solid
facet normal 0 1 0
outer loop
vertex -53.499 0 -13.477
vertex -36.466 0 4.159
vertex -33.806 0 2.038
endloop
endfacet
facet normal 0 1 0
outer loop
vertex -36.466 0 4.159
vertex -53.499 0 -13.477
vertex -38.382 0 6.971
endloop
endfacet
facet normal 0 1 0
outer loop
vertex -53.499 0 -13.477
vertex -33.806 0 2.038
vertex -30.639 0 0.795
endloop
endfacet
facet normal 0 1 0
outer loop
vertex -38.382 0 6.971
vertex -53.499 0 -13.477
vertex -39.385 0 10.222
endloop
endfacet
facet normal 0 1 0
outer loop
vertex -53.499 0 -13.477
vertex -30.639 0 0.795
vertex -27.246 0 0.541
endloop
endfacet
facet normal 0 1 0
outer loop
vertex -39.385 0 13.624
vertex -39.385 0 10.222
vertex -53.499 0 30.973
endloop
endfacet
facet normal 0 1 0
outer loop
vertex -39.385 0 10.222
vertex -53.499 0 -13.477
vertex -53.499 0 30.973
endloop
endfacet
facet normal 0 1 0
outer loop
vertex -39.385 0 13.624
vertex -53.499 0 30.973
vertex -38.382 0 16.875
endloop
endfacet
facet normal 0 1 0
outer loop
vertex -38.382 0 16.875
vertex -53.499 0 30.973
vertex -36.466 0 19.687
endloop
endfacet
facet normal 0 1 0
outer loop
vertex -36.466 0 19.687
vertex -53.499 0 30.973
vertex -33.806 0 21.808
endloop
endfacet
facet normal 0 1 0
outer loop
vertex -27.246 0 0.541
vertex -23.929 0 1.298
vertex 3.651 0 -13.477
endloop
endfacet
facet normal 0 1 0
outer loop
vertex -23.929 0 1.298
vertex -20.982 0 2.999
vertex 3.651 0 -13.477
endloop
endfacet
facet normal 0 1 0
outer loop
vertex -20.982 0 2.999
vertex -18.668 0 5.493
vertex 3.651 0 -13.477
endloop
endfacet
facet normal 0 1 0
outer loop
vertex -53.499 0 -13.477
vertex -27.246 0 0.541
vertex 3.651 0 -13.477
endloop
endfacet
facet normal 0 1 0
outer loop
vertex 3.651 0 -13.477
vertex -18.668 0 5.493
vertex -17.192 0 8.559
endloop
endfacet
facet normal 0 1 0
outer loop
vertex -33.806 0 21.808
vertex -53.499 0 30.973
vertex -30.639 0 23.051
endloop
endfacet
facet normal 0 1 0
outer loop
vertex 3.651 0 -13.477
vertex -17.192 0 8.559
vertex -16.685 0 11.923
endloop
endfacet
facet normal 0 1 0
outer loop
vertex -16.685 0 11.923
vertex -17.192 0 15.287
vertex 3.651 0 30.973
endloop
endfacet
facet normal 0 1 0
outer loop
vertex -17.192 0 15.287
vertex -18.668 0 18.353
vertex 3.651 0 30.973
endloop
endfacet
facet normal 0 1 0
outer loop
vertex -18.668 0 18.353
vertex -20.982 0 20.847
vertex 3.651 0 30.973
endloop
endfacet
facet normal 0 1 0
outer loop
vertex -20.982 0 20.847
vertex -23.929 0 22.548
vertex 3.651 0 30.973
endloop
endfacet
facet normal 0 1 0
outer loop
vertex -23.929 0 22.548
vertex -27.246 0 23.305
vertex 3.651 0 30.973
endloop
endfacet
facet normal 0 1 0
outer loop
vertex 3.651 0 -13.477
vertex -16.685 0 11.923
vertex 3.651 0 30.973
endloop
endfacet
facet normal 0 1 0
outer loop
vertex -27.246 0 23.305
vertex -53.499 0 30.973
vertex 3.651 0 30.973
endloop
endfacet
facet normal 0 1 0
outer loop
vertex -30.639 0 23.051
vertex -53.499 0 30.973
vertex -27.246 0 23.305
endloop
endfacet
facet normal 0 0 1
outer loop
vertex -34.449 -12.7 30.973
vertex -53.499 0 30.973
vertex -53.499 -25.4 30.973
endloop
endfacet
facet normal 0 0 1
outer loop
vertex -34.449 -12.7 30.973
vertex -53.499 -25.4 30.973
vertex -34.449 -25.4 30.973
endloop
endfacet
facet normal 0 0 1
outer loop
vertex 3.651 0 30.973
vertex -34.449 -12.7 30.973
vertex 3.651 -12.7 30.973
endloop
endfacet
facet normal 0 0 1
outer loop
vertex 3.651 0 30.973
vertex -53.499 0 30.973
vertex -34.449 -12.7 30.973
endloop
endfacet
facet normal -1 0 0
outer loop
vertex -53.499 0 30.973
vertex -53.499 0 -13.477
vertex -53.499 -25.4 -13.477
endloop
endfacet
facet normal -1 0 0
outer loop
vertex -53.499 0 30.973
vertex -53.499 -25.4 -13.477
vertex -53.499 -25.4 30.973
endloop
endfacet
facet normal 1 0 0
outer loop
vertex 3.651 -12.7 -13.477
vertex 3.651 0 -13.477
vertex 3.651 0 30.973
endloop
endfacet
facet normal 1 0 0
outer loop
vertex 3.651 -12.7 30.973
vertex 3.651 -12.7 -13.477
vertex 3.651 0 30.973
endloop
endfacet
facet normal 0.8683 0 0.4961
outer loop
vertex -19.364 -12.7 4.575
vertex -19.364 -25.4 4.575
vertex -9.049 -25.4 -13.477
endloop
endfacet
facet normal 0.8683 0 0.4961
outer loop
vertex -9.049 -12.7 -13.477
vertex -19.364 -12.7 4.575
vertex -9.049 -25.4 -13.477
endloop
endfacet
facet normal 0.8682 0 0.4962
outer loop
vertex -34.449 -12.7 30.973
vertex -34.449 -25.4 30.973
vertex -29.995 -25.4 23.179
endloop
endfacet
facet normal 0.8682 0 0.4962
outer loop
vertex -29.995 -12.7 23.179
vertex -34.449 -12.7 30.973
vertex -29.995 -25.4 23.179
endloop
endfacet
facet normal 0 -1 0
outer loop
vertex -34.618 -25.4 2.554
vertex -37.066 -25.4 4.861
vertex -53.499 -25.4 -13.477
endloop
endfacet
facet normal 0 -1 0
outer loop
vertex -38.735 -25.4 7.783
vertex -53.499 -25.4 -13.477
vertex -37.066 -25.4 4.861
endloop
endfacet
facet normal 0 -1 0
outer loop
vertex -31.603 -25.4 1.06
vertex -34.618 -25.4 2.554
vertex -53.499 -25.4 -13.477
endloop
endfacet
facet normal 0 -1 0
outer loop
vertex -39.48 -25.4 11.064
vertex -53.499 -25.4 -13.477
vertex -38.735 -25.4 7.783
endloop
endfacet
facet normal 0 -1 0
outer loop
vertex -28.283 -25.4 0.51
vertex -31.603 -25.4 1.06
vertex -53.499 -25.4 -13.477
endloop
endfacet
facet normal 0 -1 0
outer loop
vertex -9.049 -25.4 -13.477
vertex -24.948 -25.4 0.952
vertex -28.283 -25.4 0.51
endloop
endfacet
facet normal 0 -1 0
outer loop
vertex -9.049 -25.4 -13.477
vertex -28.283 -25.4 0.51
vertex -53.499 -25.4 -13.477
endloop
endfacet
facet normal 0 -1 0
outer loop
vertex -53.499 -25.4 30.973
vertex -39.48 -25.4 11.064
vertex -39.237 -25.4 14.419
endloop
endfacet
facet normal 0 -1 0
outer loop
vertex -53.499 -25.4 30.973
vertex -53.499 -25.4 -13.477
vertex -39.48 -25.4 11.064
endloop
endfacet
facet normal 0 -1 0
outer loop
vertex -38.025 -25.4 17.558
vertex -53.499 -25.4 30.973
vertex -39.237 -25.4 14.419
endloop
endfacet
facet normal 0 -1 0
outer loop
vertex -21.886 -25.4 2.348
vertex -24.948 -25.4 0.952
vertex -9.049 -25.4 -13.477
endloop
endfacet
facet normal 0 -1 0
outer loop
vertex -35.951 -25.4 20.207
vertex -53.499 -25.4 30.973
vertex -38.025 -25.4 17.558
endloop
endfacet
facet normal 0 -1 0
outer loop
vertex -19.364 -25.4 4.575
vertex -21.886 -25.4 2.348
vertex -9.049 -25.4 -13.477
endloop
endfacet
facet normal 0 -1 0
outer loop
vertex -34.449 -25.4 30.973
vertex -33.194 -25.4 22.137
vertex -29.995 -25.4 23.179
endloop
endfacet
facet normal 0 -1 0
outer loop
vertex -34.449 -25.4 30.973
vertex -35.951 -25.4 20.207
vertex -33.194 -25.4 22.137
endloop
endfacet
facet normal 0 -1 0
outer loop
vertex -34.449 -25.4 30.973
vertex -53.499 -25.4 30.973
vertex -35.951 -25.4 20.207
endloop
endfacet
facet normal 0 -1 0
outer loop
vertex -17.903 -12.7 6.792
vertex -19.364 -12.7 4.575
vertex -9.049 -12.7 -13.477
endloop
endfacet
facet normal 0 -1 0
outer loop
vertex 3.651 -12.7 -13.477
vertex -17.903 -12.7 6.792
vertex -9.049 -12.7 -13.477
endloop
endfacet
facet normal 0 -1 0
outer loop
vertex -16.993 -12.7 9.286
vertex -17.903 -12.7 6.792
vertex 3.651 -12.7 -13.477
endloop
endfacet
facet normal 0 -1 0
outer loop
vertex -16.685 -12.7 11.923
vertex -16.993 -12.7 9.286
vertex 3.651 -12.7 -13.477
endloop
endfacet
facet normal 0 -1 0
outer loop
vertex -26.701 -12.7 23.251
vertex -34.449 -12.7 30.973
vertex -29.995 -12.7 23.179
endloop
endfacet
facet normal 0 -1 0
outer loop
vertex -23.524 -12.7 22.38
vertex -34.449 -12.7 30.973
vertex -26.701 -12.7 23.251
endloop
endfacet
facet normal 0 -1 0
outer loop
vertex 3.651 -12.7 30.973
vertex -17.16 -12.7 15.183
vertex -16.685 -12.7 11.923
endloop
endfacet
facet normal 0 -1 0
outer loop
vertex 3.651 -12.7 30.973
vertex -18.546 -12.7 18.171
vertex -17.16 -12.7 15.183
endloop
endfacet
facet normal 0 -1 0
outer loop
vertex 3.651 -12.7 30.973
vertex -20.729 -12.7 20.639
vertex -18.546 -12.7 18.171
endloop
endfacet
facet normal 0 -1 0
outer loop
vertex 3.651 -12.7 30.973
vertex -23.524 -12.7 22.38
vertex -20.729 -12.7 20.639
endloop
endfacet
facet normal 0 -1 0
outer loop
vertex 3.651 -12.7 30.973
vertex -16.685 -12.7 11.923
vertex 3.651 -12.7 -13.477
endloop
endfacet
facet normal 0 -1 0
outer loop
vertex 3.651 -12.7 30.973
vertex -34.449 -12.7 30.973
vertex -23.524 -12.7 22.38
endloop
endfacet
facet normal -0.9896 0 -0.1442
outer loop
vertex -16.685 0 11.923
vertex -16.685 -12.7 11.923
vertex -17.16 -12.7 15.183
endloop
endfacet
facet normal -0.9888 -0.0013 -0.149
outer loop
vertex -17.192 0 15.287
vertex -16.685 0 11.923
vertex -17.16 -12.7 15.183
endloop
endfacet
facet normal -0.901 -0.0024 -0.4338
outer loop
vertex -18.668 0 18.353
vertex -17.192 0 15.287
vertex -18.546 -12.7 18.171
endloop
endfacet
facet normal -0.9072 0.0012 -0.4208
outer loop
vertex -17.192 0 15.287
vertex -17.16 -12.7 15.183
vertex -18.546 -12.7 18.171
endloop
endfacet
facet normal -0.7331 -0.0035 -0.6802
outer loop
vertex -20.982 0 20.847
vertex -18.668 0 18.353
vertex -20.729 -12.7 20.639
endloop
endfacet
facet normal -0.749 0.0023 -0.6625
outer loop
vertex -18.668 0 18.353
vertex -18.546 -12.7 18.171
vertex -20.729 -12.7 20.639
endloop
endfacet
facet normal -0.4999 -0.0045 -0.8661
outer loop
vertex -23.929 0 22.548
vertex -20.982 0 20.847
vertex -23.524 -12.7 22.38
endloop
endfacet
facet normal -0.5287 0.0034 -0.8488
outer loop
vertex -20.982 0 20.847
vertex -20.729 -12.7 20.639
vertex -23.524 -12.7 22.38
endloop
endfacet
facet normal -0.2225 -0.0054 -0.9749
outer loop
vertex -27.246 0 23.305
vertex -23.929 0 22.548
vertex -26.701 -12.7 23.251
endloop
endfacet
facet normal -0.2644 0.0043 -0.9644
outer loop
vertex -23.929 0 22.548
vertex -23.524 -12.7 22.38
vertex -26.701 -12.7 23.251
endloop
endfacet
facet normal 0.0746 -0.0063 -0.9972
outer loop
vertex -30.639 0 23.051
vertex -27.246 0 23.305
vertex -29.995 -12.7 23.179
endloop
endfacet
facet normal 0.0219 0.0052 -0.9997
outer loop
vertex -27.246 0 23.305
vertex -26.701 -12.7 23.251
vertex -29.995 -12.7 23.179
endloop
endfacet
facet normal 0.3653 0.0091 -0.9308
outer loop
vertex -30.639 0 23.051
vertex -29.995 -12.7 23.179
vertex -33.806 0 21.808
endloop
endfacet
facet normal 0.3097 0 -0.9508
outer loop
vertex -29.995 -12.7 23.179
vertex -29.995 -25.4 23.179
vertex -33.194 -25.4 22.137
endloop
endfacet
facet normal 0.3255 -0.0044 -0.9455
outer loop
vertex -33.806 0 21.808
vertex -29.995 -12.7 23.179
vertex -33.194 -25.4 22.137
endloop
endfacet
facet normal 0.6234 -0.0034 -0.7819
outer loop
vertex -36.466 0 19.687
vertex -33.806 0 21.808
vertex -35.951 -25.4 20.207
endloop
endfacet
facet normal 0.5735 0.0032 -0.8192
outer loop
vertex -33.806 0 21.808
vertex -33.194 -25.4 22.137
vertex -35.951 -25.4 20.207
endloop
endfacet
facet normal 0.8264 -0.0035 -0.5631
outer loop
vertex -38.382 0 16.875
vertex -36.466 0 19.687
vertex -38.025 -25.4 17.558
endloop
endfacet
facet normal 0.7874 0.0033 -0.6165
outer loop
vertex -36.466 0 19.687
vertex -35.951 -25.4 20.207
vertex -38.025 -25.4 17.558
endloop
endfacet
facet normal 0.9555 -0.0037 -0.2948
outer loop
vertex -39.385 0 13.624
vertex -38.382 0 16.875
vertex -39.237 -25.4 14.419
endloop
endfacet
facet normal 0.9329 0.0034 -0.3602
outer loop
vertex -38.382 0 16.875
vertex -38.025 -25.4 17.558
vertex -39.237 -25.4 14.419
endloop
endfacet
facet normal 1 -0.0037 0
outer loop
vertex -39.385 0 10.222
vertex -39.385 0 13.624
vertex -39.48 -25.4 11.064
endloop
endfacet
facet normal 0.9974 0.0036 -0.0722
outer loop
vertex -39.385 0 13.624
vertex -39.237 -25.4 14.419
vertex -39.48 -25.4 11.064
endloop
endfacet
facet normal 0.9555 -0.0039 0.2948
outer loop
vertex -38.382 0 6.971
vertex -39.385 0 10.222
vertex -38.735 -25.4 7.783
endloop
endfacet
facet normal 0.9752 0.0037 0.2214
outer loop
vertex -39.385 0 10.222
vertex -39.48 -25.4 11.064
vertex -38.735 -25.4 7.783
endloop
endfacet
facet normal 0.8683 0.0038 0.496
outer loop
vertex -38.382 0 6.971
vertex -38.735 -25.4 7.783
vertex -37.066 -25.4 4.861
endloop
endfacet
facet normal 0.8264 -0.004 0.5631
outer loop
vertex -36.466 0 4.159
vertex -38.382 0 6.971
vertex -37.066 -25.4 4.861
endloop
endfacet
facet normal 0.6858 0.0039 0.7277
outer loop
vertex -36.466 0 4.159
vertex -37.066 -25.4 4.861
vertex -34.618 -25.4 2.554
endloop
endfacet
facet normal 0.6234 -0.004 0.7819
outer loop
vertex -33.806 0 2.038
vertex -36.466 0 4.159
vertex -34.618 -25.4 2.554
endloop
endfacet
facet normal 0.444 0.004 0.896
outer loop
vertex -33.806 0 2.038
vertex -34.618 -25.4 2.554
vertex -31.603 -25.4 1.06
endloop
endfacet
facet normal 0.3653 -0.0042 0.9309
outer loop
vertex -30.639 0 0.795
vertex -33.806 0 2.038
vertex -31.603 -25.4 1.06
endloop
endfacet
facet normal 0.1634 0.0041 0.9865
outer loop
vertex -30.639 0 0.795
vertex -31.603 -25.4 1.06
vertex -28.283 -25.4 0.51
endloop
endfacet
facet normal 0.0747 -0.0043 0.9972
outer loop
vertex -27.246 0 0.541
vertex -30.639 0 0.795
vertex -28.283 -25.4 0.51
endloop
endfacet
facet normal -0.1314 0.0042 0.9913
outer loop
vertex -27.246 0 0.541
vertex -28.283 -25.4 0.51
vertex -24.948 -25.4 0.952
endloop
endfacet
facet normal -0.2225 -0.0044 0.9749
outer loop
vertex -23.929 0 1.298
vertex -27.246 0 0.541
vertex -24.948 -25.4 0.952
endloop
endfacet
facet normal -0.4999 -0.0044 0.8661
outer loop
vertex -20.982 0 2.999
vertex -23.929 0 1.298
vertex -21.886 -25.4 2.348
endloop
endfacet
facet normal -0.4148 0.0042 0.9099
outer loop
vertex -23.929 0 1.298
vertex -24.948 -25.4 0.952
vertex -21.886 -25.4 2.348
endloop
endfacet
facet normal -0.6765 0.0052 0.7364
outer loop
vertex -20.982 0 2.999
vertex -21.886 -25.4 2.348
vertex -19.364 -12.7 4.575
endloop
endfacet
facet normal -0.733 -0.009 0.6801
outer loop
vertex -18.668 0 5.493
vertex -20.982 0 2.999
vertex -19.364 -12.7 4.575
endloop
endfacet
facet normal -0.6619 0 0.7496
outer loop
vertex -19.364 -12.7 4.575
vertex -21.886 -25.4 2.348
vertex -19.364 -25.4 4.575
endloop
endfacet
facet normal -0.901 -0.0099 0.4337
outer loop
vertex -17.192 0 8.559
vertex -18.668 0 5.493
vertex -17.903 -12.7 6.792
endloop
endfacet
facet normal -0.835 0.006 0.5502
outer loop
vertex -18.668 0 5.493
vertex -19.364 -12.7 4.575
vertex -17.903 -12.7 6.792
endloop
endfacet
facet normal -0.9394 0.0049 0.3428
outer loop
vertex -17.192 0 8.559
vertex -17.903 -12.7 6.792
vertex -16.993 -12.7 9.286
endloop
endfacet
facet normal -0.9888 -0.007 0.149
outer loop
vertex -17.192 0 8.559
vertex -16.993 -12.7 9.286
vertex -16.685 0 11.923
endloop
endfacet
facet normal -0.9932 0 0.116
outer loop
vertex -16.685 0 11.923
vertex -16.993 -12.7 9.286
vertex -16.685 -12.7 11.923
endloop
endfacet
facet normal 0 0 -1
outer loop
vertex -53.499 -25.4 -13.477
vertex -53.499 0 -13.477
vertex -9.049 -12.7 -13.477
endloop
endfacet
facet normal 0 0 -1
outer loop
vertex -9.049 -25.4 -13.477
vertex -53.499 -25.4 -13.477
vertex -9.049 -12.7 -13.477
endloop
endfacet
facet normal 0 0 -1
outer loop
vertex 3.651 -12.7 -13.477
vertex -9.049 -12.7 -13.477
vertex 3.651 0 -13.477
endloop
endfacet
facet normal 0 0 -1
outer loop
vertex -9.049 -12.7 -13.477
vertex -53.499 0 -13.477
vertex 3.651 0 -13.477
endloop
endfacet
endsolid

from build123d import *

# Parameters (mm, degrees)
F0_W     = 57.15
F0_H     = 44.45
F1_DEPTH = 25.4
F2_R     = 11.414104
F3_DEPTH = 25.4
F5_DEPTH = 12.7


with BuildPart() as f1:
    # F0 (on Front) → F1 (new body)
    with BuildSketch(Plane.XZ):
        with Locations((-24.923741, 8.748023)):
            Rectangle(F0_W, F0_H)
    extrude(amount=F1_DEPTH)

    # F2 (on face) → F3 (cut)
    with BuildSketch(Plane.XZ.offset(25.4)):
        with Locations((-28.098741, 11.923023)):
            Circle(F2_R)
    extrude(amount=-F3_DEPTH, mode=Mode.SUBTRACT)

    # F4 (on face) → F5 (cut)
    with BuildSketch(Plane.XZ.offset(25.4)):
        Polygon((3.651259, 30.973023), (-34.448741, 30.973023), (-9.048741, -13.476977), (3.651259, -13.476977), align=None)
    extrude(amount=-F5_DEPTH, mode=Mode.SUBTRACT)


solid = f1.part
